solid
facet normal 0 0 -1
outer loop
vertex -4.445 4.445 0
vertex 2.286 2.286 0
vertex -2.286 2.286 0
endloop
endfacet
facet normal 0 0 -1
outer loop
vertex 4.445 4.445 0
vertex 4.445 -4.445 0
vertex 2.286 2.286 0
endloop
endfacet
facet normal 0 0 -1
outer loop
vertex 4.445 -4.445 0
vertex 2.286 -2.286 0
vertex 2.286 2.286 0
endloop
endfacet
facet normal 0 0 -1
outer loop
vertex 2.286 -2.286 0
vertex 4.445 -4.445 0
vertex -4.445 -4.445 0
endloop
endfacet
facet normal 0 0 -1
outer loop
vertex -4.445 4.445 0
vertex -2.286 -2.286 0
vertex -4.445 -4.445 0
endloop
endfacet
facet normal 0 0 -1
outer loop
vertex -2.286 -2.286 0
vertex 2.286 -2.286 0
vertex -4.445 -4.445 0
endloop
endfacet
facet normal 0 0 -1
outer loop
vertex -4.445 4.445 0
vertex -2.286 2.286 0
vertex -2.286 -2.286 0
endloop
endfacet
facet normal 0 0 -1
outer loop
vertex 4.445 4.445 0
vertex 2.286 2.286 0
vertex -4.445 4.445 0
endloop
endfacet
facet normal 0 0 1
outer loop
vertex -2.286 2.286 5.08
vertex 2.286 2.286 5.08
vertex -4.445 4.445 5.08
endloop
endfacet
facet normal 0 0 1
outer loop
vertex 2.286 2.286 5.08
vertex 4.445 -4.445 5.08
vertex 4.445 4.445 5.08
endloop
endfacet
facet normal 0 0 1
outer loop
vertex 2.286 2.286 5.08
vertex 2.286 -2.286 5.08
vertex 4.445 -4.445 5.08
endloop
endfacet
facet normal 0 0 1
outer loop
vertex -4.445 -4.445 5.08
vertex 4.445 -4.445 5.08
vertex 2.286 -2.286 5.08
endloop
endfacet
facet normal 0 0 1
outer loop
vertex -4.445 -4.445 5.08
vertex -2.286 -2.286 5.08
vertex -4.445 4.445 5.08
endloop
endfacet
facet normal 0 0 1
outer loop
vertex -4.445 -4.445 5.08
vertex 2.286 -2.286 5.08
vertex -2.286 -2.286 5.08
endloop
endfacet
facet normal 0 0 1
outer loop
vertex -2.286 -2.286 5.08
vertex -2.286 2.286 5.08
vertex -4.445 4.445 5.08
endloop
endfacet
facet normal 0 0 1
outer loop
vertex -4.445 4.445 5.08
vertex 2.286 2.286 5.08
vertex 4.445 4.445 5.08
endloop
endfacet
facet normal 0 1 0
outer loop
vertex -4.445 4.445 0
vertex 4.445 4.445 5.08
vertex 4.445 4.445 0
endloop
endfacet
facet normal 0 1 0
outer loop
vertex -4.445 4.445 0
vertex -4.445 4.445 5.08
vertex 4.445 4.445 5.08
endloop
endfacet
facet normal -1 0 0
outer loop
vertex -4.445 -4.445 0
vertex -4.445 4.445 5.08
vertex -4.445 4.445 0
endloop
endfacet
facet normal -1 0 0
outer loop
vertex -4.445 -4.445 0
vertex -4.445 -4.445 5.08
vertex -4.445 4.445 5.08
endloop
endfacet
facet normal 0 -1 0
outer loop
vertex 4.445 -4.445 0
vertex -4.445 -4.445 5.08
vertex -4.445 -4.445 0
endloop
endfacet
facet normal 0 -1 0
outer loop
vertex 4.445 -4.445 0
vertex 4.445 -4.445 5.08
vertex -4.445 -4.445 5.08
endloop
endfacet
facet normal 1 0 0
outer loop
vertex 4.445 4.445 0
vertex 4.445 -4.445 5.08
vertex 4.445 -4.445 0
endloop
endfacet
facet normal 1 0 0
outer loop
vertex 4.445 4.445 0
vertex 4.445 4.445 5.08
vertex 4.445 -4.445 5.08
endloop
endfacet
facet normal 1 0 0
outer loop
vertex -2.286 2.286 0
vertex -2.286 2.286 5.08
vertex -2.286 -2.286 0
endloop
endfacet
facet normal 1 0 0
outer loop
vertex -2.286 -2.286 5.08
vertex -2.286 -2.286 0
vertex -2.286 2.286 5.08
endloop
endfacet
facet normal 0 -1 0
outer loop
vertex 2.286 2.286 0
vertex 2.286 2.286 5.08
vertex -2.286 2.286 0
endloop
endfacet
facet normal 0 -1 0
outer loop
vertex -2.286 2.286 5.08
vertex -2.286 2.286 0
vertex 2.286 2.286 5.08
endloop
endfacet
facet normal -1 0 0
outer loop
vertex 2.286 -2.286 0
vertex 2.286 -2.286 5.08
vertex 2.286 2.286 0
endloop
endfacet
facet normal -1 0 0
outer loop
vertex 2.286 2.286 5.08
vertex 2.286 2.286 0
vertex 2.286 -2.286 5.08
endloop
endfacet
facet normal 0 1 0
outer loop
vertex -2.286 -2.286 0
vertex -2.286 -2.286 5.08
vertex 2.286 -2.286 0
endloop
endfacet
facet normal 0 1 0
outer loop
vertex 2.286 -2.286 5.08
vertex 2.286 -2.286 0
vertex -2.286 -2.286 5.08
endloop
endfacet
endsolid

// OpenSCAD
ViewScale = [0.0254, 0.0254, 0.0254];

module case()
{
    linear_extrude(200)
    difference() {
        square([350, 350], center=true);
        square([180, 180], center=true);
    }
}

module forViewing()
{
    case();
}

module forPrinting()
{
}

scale(ViewScale)
{
    forViewing();
}
